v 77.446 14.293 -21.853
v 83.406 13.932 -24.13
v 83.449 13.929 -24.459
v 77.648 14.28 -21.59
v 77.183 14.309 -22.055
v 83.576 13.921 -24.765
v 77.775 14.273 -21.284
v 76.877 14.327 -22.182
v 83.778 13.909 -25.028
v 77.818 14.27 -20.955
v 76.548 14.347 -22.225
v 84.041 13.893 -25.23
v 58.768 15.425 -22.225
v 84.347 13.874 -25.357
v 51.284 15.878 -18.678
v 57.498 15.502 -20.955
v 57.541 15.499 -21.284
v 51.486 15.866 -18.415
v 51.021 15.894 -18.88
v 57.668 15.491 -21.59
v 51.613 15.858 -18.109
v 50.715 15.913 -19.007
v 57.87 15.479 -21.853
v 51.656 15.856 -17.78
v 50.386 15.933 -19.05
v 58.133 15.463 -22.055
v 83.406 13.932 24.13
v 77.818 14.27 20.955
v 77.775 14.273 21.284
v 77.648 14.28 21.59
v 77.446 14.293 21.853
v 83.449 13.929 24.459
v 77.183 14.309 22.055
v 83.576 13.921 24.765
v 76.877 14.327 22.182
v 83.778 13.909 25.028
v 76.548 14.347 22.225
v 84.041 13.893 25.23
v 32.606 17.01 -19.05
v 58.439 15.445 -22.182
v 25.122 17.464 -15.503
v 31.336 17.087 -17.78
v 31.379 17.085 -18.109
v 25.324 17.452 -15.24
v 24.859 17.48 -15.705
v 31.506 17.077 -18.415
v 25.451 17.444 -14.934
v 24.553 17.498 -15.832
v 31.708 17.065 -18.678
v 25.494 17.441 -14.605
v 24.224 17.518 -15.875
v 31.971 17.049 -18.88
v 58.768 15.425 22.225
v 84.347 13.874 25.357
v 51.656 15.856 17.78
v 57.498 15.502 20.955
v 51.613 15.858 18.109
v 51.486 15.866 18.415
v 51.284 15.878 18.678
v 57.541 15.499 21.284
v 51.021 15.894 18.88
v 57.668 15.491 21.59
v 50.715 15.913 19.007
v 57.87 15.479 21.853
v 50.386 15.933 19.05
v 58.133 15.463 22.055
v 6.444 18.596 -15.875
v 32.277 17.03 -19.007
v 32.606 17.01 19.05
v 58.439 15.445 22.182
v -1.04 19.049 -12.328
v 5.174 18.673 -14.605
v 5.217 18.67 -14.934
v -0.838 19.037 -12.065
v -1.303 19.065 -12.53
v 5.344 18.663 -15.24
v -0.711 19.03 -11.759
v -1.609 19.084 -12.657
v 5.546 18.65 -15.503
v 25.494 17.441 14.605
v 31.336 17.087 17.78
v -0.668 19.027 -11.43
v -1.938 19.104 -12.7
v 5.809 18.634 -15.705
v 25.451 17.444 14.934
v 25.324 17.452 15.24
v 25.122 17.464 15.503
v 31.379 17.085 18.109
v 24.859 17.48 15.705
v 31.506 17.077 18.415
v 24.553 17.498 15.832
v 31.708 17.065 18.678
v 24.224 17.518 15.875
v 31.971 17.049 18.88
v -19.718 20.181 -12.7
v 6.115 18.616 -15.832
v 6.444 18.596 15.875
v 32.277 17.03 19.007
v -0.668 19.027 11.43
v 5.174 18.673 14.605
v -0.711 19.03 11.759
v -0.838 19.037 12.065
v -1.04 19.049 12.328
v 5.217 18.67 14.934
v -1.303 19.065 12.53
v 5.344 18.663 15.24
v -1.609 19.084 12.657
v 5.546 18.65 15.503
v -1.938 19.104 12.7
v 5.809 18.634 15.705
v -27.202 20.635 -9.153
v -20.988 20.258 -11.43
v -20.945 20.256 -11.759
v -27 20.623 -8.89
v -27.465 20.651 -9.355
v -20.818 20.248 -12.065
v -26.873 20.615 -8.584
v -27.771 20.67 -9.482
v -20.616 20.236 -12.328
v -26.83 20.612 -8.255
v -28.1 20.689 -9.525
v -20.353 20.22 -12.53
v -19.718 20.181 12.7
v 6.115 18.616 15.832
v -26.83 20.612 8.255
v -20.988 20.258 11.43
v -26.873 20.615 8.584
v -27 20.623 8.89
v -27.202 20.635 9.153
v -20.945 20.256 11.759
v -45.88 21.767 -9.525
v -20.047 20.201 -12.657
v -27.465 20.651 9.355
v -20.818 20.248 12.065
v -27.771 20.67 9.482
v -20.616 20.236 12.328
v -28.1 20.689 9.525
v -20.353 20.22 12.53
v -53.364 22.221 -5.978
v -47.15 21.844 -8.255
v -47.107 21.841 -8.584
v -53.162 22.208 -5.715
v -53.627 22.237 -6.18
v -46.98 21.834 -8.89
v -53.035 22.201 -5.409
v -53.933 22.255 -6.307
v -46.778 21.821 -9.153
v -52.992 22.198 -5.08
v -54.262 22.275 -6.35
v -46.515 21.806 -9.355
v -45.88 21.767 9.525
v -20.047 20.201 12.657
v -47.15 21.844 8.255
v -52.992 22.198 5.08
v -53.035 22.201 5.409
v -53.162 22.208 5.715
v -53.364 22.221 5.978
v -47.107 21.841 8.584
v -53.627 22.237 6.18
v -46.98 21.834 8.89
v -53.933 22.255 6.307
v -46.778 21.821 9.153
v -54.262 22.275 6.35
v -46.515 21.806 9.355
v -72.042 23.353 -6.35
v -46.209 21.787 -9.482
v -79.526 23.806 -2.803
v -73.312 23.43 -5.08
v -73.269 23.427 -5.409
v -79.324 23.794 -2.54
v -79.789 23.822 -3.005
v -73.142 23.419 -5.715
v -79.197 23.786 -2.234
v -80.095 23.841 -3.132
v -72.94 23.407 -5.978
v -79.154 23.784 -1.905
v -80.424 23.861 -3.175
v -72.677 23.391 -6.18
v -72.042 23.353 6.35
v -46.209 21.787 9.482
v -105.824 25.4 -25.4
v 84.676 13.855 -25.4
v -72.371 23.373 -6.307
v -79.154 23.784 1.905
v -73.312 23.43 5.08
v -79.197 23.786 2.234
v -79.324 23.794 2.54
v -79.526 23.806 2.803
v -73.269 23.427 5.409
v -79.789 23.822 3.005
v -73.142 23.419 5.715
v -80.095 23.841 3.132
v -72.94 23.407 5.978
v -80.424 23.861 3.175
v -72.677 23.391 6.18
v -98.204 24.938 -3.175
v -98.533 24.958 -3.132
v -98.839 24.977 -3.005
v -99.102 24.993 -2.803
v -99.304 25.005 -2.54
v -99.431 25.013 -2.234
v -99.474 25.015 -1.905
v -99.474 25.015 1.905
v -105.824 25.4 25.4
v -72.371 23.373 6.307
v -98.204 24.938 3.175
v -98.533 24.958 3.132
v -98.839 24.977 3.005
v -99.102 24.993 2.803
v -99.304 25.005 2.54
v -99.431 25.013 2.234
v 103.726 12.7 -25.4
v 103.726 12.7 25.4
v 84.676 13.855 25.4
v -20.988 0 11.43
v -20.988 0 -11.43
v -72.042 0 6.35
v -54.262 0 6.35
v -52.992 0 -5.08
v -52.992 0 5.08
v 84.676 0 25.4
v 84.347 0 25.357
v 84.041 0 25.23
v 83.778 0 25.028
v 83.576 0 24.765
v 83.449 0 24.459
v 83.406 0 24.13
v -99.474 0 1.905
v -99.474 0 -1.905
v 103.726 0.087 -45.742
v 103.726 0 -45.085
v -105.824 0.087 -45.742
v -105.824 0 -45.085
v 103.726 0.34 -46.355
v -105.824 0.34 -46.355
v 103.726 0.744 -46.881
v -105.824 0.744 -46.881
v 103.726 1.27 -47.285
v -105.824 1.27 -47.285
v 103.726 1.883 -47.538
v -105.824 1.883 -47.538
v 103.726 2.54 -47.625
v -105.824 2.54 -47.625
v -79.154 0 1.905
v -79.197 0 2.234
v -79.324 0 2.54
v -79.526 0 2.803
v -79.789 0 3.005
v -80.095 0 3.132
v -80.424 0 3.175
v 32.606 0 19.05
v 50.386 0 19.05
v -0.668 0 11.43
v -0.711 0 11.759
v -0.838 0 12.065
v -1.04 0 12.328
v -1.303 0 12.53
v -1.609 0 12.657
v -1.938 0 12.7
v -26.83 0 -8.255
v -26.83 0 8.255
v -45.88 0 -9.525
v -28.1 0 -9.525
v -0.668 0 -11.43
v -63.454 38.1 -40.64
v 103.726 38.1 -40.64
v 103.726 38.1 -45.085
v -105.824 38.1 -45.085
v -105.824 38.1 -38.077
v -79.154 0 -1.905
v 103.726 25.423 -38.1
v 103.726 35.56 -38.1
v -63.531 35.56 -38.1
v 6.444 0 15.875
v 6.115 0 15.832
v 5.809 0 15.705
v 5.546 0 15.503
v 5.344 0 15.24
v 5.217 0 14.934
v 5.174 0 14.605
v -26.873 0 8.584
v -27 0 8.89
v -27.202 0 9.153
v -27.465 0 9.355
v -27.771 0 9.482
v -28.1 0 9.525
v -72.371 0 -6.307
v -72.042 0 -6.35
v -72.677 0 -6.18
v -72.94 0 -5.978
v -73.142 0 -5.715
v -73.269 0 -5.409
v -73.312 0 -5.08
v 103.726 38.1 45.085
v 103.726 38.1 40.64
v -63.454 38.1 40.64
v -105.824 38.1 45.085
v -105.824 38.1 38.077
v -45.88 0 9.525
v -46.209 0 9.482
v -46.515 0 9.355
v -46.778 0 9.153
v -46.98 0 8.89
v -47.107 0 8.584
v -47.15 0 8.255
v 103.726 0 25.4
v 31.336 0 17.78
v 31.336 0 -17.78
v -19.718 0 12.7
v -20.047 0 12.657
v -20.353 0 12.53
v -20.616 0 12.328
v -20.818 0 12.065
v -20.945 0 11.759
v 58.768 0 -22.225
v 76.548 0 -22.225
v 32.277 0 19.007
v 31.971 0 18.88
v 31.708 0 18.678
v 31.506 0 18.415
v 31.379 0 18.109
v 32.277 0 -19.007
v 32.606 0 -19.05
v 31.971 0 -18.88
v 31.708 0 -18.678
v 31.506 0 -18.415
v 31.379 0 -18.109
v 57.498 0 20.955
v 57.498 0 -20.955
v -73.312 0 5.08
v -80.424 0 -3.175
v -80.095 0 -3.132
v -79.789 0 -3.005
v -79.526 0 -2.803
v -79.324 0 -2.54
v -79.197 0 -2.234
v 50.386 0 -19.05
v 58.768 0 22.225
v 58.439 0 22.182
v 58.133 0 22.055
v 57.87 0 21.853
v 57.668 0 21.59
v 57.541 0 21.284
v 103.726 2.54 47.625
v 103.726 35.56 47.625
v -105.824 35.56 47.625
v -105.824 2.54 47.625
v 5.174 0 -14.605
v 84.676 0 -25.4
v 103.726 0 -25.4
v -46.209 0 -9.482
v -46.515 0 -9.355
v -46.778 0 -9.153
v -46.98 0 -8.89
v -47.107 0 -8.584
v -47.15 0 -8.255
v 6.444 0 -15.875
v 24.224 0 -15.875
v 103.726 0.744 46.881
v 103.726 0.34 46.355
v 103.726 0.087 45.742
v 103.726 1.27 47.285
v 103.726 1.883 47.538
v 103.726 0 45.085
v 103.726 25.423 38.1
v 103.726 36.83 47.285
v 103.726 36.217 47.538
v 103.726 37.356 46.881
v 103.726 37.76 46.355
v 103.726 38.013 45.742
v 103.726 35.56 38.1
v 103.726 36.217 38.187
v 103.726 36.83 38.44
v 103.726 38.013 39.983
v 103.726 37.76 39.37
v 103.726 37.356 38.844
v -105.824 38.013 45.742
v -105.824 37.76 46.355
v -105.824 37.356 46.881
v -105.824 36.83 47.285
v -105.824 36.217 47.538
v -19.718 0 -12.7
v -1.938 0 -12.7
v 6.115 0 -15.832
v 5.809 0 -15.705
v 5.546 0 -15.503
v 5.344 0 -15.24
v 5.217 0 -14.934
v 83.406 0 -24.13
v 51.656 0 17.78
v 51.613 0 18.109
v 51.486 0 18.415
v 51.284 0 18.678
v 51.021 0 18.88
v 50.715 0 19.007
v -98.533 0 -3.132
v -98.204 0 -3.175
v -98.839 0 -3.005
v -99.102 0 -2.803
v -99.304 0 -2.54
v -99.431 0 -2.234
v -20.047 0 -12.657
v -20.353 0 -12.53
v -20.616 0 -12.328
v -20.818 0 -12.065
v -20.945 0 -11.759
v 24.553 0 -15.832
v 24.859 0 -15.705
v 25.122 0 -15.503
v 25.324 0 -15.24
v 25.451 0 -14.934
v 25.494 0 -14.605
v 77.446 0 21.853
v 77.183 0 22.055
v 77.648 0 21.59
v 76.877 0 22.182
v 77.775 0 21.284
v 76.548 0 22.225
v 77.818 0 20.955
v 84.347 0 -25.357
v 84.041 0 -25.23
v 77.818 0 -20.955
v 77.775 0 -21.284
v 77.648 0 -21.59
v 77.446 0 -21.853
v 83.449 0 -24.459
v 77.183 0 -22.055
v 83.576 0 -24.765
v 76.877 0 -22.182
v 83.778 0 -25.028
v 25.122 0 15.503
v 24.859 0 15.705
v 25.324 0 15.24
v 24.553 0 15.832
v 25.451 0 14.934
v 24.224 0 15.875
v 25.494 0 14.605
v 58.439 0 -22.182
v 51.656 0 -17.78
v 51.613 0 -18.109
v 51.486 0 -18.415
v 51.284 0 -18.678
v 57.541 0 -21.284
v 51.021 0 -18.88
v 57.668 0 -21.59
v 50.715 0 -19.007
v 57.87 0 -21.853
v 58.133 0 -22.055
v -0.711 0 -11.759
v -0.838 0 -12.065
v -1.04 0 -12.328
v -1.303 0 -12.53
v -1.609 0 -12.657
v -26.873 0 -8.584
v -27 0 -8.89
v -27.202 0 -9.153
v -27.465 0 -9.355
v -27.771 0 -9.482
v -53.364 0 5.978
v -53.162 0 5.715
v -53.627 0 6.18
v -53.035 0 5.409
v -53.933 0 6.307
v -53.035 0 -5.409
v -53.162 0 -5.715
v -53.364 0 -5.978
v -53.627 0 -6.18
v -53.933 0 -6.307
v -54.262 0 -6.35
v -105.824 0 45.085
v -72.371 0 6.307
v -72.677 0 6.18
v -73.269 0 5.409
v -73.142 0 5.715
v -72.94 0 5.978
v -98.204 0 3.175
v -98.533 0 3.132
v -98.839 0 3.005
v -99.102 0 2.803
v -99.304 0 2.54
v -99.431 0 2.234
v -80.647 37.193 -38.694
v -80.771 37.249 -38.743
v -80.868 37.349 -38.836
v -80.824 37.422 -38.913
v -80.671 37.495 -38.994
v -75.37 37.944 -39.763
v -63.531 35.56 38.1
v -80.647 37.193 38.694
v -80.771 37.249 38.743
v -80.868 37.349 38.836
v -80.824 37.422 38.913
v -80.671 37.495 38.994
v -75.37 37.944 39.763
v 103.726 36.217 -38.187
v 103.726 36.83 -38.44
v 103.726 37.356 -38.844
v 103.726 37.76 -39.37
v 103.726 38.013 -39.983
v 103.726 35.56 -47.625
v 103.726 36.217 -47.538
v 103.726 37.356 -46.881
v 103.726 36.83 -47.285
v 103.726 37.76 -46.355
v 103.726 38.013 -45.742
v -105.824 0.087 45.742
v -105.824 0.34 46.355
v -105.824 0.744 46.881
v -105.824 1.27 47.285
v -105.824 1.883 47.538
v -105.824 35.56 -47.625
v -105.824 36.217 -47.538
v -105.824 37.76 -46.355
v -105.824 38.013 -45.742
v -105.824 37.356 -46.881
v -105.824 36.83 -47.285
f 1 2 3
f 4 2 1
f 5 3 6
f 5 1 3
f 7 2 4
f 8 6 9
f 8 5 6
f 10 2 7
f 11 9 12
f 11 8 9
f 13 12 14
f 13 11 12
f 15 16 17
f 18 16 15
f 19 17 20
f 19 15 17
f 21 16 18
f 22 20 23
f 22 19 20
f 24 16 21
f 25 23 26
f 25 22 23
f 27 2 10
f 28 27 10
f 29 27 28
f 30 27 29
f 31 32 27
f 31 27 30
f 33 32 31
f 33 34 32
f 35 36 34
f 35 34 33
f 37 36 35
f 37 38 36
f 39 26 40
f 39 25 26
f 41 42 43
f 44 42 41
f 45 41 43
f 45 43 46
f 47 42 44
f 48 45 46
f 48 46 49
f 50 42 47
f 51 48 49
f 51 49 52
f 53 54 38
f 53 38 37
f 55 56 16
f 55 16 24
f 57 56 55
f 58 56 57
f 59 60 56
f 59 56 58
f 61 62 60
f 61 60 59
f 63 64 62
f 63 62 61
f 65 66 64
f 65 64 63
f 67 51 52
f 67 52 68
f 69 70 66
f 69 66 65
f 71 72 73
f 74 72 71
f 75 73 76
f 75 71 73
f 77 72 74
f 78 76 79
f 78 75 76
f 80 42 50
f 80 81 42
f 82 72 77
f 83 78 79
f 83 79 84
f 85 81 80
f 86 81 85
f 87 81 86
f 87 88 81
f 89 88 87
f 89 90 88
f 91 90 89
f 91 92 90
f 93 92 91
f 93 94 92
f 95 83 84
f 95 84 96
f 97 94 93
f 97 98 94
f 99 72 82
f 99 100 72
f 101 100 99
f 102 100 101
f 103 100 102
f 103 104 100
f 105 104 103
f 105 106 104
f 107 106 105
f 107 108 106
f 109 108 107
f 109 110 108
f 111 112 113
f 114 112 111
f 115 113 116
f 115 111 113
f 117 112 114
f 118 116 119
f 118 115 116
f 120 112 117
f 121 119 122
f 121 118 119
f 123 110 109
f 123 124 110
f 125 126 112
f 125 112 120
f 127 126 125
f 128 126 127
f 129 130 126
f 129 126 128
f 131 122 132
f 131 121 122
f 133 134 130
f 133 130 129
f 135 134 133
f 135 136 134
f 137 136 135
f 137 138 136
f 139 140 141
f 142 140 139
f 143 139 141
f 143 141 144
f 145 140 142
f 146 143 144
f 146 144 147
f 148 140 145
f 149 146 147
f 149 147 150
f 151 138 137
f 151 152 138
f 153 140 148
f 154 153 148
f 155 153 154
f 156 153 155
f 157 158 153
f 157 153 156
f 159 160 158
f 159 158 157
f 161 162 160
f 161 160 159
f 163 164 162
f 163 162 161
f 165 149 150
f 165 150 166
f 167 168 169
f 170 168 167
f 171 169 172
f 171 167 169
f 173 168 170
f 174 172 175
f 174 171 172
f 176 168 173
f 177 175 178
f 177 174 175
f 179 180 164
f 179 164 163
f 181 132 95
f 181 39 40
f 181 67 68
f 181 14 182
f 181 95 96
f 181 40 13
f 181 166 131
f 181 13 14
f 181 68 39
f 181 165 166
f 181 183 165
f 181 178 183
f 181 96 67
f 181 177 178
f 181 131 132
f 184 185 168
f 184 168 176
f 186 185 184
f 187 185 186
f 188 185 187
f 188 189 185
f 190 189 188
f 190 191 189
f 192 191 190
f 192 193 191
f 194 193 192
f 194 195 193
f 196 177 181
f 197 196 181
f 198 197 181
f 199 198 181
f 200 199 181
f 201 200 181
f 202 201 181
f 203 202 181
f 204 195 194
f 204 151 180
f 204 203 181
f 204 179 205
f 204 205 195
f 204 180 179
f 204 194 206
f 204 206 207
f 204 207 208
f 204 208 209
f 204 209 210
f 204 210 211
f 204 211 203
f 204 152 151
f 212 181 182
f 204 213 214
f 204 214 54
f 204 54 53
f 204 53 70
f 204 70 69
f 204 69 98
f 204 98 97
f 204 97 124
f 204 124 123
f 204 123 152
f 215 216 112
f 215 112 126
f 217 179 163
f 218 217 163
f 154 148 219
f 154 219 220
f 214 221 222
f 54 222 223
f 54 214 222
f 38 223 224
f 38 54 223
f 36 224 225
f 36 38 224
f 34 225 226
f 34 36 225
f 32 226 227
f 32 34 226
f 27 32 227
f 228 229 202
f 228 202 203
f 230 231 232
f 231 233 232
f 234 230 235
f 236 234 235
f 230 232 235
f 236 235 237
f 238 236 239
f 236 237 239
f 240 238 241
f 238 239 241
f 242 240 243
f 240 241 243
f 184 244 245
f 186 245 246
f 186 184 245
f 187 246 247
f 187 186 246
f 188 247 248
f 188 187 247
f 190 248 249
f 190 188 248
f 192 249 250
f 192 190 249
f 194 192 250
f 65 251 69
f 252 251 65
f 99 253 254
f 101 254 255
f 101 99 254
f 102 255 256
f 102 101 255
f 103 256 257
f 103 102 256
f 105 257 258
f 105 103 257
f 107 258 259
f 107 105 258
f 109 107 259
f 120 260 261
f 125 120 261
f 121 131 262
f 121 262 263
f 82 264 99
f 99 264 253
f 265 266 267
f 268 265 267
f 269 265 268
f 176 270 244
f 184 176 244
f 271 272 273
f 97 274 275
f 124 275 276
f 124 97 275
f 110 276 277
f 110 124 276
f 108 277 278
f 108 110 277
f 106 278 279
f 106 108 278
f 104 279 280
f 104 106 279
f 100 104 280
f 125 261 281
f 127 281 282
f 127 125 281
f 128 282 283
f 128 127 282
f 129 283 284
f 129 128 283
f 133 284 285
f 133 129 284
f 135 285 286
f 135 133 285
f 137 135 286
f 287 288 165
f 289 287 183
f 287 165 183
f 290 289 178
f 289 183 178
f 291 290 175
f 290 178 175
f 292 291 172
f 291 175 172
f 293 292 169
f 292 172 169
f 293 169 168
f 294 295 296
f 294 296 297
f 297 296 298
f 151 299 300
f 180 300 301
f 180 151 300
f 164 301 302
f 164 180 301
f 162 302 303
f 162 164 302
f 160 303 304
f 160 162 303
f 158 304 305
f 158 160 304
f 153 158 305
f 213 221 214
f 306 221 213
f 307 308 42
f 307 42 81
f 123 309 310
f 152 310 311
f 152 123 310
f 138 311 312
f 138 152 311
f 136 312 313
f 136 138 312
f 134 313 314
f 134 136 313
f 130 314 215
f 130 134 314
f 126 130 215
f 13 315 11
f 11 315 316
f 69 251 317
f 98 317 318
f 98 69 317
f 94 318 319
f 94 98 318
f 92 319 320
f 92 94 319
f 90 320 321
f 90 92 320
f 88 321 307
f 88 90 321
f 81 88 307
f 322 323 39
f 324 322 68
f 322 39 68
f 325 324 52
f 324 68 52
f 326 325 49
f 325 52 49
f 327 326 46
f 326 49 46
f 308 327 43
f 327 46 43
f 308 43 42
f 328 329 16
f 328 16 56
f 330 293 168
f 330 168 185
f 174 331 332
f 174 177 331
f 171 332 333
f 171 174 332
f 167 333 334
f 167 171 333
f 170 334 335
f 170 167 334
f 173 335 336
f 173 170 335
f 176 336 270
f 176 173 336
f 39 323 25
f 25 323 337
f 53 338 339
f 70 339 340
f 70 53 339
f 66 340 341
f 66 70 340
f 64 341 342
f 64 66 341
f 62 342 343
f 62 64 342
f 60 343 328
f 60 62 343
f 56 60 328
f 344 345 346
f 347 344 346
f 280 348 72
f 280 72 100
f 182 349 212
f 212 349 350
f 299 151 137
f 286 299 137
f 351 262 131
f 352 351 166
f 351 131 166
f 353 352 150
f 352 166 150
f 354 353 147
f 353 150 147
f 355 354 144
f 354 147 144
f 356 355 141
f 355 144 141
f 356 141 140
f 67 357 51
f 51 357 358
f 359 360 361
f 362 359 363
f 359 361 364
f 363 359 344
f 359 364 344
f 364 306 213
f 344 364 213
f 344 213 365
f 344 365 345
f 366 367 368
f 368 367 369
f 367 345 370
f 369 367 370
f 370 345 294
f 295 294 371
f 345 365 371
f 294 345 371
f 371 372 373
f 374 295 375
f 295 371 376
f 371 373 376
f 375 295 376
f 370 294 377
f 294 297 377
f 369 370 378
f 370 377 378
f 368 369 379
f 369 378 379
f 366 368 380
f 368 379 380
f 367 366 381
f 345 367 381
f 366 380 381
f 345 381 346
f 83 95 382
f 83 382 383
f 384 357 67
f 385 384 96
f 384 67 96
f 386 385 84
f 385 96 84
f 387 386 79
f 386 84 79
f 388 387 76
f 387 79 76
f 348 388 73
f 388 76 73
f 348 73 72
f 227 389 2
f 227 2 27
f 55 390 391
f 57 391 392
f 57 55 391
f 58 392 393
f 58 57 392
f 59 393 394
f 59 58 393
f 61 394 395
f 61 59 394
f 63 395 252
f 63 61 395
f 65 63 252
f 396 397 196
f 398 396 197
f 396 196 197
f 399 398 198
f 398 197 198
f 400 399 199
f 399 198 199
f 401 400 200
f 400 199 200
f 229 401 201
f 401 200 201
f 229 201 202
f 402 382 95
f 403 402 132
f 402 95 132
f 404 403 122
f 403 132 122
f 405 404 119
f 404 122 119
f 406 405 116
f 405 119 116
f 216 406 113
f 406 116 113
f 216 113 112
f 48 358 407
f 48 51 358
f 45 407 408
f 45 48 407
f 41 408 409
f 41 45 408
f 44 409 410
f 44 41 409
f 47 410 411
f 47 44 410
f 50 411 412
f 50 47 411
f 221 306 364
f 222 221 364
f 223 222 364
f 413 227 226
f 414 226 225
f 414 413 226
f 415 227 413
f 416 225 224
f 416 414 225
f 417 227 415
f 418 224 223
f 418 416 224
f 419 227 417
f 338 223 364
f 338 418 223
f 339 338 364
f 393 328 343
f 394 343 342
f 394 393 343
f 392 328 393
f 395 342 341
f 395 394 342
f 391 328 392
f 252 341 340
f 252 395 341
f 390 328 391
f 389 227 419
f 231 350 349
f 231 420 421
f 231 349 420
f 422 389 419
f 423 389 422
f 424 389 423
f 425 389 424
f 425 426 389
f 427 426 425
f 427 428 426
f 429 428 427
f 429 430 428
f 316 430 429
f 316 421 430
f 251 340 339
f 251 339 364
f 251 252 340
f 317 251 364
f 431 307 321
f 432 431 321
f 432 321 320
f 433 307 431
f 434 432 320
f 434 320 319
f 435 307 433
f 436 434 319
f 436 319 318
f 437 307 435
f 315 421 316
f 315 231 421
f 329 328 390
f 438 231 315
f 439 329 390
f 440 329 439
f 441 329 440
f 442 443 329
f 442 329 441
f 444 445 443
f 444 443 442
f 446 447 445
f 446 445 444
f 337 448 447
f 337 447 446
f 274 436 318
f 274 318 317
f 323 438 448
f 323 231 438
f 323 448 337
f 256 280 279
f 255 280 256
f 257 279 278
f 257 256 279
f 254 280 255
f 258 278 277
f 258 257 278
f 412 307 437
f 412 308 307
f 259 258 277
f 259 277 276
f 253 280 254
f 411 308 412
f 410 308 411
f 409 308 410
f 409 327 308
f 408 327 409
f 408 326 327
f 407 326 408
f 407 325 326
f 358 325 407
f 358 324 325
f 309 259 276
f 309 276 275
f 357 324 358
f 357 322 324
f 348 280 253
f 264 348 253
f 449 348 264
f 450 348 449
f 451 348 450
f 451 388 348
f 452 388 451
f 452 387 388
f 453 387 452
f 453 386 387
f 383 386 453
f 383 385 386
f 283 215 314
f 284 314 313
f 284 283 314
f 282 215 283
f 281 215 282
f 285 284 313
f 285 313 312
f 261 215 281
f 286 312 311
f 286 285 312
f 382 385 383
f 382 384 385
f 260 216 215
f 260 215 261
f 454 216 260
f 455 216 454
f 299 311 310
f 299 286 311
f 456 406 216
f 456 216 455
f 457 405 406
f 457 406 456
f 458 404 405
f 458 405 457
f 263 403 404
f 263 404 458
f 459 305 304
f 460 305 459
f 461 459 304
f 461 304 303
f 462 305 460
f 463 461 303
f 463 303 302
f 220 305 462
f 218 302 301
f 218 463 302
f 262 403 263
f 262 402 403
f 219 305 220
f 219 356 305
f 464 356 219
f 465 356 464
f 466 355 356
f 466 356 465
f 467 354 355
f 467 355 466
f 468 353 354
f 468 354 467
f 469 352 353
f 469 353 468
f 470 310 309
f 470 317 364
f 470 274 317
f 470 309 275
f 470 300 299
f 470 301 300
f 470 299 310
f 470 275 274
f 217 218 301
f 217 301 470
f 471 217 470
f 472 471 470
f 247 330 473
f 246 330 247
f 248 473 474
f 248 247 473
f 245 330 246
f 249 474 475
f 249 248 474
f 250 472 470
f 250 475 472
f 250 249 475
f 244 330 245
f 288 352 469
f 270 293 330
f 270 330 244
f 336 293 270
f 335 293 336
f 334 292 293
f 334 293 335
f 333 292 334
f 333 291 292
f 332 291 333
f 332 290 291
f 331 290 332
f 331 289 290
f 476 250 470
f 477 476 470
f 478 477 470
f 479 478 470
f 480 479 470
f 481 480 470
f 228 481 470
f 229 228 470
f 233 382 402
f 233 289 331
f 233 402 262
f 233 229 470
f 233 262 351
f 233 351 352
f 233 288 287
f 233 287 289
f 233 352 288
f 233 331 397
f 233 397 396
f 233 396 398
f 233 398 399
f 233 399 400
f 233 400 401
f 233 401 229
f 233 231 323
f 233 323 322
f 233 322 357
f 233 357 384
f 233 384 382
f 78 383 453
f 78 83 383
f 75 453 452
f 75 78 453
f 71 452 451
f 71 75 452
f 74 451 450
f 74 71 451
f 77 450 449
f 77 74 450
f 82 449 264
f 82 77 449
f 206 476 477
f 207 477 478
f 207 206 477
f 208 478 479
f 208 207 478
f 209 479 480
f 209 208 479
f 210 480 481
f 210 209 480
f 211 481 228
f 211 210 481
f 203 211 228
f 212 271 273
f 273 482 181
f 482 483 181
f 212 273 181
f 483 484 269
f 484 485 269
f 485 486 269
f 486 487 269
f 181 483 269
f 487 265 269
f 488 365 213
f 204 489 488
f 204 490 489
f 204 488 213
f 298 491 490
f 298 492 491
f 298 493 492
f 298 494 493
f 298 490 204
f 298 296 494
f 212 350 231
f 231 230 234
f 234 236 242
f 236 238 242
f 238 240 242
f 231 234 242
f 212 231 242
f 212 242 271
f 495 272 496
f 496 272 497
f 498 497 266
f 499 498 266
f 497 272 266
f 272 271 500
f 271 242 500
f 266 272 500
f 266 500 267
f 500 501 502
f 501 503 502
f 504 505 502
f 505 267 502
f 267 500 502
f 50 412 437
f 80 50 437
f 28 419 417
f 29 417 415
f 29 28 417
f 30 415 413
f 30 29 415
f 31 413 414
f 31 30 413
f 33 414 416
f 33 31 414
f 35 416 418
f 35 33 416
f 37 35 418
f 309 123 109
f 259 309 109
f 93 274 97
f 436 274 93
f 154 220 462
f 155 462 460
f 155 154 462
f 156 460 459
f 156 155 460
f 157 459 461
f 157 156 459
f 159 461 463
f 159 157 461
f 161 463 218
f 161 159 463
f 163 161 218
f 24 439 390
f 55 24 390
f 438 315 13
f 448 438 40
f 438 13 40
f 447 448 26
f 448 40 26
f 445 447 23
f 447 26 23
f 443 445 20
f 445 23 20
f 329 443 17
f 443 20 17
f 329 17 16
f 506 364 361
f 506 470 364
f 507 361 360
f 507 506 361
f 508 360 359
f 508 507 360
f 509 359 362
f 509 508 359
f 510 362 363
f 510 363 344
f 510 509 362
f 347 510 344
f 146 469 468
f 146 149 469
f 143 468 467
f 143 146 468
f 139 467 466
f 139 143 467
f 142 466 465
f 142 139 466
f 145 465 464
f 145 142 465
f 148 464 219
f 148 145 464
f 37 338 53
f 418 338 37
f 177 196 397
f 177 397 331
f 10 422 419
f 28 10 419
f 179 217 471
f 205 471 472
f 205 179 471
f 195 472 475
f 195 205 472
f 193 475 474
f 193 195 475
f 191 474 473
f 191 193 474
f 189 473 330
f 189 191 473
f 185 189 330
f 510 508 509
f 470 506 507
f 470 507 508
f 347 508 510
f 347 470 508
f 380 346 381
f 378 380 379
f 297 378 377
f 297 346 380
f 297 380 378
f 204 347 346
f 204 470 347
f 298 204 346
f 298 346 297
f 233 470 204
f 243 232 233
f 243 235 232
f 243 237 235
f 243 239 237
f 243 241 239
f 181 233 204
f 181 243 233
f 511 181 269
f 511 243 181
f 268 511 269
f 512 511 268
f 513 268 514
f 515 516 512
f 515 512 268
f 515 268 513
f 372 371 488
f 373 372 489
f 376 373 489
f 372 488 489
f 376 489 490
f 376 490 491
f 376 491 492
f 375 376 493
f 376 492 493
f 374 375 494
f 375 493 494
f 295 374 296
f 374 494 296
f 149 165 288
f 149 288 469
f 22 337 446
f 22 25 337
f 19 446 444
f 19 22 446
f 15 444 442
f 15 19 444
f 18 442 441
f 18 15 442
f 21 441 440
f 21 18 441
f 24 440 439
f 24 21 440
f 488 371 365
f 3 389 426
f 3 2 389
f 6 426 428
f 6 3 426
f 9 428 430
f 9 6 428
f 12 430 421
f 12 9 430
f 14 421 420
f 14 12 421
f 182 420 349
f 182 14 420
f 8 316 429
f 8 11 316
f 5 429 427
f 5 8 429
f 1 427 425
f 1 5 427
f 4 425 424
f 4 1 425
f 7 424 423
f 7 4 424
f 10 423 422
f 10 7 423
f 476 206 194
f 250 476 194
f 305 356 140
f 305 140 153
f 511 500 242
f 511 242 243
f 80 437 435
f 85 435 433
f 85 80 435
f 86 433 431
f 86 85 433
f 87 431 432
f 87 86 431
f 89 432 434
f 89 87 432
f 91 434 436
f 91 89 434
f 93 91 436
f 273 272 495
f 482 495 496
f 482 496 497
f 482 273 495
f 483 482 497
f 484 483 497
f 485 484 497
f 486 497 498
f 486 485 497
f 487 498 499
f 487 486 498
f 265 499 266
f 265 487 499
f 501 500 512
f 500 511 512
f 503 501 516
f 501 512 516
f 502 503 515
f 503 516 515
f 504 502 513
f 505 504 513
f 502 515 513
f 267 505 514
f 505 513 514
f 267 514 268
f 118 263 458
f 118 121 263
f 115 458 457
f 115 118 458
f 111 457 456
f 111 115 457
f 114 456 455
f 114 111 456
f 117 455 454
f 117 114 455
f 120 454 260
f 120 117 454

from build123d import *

# Parameters (mm, degrees)
BOSS_EXTRUDE1_DEPTH = 38.1
SKETCH2_W           = 209.55
SKETCH2_H           = 38.1
BOSS_EXTRUDE2_DEPTH = 9.525
SKETCH3_W           = 20.32
SKETCH3_H           = 6.35
SKETCH3_H_2         = 12.7
SKETCH3_H_3         = 19.05
SKETCH3_H_4         = 25.4
SKETCH3_H_5         = 31.75
SKETCH3_H_6         = 38.1
SKETCH3_H_7         = 44.45
SKETCH3_H_8         = 50.8
CUT_EXTRUDE1_DEPTH  = 123.141181515
FILLET1_R           = 1.27
CHAMFER1_SIZE       = 12.7
FILLET2_R           = 2.54


with BuildPart() as part:
    # Sketch1 → Boss-Extrude1 (new, symmetric)
    with BuildSketch(Plane.XY):
        Polygon((-105.823993484, 0), (103.726006516, 0), (103.726006516, 12.7), (-105.823993484, 25.4), align=None)
    extrude(amount=BOSS_EXTRUDE1_DEPTH, both=True)

    # Sketch2 → Boss-Extrude2 (add)
    with BuildSketch(Plane(origin=(0, 0, -38.1), x_dir=(-1, 0, 0), z_dir=(0, 0, -1))):
        with Locations((1.048993484, 19.05)):
            Rectangle(SKETCH2_W, SKETCH2_H)
    boss_extrude2 = extrude(amount=BOSS_EXTRUDE2_DEPTH)

    # Mirror1: Boss-Extrude2 across plane
    add(boss_extrude2.mirror(Plane.XY))

    # Sketch3 → Cut-Extrude1 (cut, through all)
    with BuildSketch(Plane.XZ):
        with Locations((-89.313993484, 0)):
            Rectangle(SKETCH3_W, SKETCH3_H)
        with Locations((-63.151993484, 0)):
            Rectangle(SKETCH3_W, SKETCH3_H_2)
        with Locations((-36.989993484, 0)):
            Rectangle(SKETCH3_W, SKETCH3_H_3)
        with Locations((-10.827993484, 0)):
            Rectangle(SKETCH3_W, SKETCH3_H_4)
        with Locations((15.334006516, 0)):
            Rectangle(SKETCH3_W, SKETCH3_H_5)
        with Locations((41.496006516, 0)):
            Rectangle(SKETCH3_W, SKETCH3_H_6)
        with Locations((67.658006516, 0)):
            Rectangle(SKETCH3_W, SKETCH3_H_7)
        with Locations((93.566006516, 0)):
            Rectangle(SKETCH3_W, SKETCH3_H_8)
    extrude(amount=-CUT_EXTRUDE1_DEPTH, mode=Mode.SUBTRACT)

    # Fillet1
    fillet1_edges = [part.edges().sort_by_distance(p)[0] for p in [
        (-20.987993484, 10.129212121, -12.7),
        (-20.987993484, 10.129212121, 12.7),
        (-0.667993484, 9.513454545, 12.7),
        (-0.667993484, 9.513454545, -12.7),
        (5.174006516, 9.336424242, -15.875),
        (5.174006516, 9.336424242, 15.875),
        (25.494006516, 8.720666667, 15.875),
        (25.494006516, 8.720666667, -15.875),
        (31.336006516, 8.543636364, -19.05),
        (31.336006516, 8.543636364, 19.05),
        (51.656006516, 7.927878788, 19.05),
        (51.656006516, 7.927878788, -19.05),
        (57.498006516, 7.750848485, -22.225),
        (57.498006516, 7.750848485, 22.225),
        (77.818006516, 7.135090909, 22.225),
        (77.818006516, 7.135090909, -22.225),
        (83.406006516, 6.965757576, -25.4),
        (83.406006516, 6.965757576, 25.4),
        (-99.473993484, 12.507575758, 3.175),
        (-79.153993484, 11.891818182, 3.175),
        (-79.153993484, 11.891818182, -3.175),
        (-99.473993484, 12.507575758, -3.175),
        (-73.311993484, 11.714787879, -6.35),
        (-73.311993484, 11.714787879, 6.35),
        (-52.991993484, 11.099030303, 6.35),
        (-52.991993484, 11.099030303, -6.35),
        (-47.149993484, 10.922, -9.525),
        (-47.149993484, 10.922, 9.525),
        (-26.829993484, 10.306242424, 9.525),
        (-26.829993484, 10.306242424, -9.525),
    ]]
    fillet(fillet1_edges, radius=FILLET1_R)

    # Chamfer1
    chamfer1_edges = [part.edges().sort_by_distance(p)[0] for p in [
        (-1.048993484, 19.05, 38.1),
        (-1.048993484, 19.05, -38.1),
    ]]
    chamfer(chamfer1_edges, length=CHAMFER1_SIZE - 0.0001)  # a hair under: the kernel refuses the full size

    # Fillet2
    fillet2_edges = [part.edges().sort_by_distance(p)[0] for p in [
        (-0.85757213, 38.1, -38.1),
        (-1.048993484, 0, -47.625),
        (-1.048993484, 38.1, -47.625),
        (-0.85757213, 38.1, 38.1),
        (-1.048993484, 38.1, 47.625),
        (-1.048993484, 0, 47.625),
    ]]
    fillet(fillet2_edges, radius=FILLET2_R)


solid = part.part
